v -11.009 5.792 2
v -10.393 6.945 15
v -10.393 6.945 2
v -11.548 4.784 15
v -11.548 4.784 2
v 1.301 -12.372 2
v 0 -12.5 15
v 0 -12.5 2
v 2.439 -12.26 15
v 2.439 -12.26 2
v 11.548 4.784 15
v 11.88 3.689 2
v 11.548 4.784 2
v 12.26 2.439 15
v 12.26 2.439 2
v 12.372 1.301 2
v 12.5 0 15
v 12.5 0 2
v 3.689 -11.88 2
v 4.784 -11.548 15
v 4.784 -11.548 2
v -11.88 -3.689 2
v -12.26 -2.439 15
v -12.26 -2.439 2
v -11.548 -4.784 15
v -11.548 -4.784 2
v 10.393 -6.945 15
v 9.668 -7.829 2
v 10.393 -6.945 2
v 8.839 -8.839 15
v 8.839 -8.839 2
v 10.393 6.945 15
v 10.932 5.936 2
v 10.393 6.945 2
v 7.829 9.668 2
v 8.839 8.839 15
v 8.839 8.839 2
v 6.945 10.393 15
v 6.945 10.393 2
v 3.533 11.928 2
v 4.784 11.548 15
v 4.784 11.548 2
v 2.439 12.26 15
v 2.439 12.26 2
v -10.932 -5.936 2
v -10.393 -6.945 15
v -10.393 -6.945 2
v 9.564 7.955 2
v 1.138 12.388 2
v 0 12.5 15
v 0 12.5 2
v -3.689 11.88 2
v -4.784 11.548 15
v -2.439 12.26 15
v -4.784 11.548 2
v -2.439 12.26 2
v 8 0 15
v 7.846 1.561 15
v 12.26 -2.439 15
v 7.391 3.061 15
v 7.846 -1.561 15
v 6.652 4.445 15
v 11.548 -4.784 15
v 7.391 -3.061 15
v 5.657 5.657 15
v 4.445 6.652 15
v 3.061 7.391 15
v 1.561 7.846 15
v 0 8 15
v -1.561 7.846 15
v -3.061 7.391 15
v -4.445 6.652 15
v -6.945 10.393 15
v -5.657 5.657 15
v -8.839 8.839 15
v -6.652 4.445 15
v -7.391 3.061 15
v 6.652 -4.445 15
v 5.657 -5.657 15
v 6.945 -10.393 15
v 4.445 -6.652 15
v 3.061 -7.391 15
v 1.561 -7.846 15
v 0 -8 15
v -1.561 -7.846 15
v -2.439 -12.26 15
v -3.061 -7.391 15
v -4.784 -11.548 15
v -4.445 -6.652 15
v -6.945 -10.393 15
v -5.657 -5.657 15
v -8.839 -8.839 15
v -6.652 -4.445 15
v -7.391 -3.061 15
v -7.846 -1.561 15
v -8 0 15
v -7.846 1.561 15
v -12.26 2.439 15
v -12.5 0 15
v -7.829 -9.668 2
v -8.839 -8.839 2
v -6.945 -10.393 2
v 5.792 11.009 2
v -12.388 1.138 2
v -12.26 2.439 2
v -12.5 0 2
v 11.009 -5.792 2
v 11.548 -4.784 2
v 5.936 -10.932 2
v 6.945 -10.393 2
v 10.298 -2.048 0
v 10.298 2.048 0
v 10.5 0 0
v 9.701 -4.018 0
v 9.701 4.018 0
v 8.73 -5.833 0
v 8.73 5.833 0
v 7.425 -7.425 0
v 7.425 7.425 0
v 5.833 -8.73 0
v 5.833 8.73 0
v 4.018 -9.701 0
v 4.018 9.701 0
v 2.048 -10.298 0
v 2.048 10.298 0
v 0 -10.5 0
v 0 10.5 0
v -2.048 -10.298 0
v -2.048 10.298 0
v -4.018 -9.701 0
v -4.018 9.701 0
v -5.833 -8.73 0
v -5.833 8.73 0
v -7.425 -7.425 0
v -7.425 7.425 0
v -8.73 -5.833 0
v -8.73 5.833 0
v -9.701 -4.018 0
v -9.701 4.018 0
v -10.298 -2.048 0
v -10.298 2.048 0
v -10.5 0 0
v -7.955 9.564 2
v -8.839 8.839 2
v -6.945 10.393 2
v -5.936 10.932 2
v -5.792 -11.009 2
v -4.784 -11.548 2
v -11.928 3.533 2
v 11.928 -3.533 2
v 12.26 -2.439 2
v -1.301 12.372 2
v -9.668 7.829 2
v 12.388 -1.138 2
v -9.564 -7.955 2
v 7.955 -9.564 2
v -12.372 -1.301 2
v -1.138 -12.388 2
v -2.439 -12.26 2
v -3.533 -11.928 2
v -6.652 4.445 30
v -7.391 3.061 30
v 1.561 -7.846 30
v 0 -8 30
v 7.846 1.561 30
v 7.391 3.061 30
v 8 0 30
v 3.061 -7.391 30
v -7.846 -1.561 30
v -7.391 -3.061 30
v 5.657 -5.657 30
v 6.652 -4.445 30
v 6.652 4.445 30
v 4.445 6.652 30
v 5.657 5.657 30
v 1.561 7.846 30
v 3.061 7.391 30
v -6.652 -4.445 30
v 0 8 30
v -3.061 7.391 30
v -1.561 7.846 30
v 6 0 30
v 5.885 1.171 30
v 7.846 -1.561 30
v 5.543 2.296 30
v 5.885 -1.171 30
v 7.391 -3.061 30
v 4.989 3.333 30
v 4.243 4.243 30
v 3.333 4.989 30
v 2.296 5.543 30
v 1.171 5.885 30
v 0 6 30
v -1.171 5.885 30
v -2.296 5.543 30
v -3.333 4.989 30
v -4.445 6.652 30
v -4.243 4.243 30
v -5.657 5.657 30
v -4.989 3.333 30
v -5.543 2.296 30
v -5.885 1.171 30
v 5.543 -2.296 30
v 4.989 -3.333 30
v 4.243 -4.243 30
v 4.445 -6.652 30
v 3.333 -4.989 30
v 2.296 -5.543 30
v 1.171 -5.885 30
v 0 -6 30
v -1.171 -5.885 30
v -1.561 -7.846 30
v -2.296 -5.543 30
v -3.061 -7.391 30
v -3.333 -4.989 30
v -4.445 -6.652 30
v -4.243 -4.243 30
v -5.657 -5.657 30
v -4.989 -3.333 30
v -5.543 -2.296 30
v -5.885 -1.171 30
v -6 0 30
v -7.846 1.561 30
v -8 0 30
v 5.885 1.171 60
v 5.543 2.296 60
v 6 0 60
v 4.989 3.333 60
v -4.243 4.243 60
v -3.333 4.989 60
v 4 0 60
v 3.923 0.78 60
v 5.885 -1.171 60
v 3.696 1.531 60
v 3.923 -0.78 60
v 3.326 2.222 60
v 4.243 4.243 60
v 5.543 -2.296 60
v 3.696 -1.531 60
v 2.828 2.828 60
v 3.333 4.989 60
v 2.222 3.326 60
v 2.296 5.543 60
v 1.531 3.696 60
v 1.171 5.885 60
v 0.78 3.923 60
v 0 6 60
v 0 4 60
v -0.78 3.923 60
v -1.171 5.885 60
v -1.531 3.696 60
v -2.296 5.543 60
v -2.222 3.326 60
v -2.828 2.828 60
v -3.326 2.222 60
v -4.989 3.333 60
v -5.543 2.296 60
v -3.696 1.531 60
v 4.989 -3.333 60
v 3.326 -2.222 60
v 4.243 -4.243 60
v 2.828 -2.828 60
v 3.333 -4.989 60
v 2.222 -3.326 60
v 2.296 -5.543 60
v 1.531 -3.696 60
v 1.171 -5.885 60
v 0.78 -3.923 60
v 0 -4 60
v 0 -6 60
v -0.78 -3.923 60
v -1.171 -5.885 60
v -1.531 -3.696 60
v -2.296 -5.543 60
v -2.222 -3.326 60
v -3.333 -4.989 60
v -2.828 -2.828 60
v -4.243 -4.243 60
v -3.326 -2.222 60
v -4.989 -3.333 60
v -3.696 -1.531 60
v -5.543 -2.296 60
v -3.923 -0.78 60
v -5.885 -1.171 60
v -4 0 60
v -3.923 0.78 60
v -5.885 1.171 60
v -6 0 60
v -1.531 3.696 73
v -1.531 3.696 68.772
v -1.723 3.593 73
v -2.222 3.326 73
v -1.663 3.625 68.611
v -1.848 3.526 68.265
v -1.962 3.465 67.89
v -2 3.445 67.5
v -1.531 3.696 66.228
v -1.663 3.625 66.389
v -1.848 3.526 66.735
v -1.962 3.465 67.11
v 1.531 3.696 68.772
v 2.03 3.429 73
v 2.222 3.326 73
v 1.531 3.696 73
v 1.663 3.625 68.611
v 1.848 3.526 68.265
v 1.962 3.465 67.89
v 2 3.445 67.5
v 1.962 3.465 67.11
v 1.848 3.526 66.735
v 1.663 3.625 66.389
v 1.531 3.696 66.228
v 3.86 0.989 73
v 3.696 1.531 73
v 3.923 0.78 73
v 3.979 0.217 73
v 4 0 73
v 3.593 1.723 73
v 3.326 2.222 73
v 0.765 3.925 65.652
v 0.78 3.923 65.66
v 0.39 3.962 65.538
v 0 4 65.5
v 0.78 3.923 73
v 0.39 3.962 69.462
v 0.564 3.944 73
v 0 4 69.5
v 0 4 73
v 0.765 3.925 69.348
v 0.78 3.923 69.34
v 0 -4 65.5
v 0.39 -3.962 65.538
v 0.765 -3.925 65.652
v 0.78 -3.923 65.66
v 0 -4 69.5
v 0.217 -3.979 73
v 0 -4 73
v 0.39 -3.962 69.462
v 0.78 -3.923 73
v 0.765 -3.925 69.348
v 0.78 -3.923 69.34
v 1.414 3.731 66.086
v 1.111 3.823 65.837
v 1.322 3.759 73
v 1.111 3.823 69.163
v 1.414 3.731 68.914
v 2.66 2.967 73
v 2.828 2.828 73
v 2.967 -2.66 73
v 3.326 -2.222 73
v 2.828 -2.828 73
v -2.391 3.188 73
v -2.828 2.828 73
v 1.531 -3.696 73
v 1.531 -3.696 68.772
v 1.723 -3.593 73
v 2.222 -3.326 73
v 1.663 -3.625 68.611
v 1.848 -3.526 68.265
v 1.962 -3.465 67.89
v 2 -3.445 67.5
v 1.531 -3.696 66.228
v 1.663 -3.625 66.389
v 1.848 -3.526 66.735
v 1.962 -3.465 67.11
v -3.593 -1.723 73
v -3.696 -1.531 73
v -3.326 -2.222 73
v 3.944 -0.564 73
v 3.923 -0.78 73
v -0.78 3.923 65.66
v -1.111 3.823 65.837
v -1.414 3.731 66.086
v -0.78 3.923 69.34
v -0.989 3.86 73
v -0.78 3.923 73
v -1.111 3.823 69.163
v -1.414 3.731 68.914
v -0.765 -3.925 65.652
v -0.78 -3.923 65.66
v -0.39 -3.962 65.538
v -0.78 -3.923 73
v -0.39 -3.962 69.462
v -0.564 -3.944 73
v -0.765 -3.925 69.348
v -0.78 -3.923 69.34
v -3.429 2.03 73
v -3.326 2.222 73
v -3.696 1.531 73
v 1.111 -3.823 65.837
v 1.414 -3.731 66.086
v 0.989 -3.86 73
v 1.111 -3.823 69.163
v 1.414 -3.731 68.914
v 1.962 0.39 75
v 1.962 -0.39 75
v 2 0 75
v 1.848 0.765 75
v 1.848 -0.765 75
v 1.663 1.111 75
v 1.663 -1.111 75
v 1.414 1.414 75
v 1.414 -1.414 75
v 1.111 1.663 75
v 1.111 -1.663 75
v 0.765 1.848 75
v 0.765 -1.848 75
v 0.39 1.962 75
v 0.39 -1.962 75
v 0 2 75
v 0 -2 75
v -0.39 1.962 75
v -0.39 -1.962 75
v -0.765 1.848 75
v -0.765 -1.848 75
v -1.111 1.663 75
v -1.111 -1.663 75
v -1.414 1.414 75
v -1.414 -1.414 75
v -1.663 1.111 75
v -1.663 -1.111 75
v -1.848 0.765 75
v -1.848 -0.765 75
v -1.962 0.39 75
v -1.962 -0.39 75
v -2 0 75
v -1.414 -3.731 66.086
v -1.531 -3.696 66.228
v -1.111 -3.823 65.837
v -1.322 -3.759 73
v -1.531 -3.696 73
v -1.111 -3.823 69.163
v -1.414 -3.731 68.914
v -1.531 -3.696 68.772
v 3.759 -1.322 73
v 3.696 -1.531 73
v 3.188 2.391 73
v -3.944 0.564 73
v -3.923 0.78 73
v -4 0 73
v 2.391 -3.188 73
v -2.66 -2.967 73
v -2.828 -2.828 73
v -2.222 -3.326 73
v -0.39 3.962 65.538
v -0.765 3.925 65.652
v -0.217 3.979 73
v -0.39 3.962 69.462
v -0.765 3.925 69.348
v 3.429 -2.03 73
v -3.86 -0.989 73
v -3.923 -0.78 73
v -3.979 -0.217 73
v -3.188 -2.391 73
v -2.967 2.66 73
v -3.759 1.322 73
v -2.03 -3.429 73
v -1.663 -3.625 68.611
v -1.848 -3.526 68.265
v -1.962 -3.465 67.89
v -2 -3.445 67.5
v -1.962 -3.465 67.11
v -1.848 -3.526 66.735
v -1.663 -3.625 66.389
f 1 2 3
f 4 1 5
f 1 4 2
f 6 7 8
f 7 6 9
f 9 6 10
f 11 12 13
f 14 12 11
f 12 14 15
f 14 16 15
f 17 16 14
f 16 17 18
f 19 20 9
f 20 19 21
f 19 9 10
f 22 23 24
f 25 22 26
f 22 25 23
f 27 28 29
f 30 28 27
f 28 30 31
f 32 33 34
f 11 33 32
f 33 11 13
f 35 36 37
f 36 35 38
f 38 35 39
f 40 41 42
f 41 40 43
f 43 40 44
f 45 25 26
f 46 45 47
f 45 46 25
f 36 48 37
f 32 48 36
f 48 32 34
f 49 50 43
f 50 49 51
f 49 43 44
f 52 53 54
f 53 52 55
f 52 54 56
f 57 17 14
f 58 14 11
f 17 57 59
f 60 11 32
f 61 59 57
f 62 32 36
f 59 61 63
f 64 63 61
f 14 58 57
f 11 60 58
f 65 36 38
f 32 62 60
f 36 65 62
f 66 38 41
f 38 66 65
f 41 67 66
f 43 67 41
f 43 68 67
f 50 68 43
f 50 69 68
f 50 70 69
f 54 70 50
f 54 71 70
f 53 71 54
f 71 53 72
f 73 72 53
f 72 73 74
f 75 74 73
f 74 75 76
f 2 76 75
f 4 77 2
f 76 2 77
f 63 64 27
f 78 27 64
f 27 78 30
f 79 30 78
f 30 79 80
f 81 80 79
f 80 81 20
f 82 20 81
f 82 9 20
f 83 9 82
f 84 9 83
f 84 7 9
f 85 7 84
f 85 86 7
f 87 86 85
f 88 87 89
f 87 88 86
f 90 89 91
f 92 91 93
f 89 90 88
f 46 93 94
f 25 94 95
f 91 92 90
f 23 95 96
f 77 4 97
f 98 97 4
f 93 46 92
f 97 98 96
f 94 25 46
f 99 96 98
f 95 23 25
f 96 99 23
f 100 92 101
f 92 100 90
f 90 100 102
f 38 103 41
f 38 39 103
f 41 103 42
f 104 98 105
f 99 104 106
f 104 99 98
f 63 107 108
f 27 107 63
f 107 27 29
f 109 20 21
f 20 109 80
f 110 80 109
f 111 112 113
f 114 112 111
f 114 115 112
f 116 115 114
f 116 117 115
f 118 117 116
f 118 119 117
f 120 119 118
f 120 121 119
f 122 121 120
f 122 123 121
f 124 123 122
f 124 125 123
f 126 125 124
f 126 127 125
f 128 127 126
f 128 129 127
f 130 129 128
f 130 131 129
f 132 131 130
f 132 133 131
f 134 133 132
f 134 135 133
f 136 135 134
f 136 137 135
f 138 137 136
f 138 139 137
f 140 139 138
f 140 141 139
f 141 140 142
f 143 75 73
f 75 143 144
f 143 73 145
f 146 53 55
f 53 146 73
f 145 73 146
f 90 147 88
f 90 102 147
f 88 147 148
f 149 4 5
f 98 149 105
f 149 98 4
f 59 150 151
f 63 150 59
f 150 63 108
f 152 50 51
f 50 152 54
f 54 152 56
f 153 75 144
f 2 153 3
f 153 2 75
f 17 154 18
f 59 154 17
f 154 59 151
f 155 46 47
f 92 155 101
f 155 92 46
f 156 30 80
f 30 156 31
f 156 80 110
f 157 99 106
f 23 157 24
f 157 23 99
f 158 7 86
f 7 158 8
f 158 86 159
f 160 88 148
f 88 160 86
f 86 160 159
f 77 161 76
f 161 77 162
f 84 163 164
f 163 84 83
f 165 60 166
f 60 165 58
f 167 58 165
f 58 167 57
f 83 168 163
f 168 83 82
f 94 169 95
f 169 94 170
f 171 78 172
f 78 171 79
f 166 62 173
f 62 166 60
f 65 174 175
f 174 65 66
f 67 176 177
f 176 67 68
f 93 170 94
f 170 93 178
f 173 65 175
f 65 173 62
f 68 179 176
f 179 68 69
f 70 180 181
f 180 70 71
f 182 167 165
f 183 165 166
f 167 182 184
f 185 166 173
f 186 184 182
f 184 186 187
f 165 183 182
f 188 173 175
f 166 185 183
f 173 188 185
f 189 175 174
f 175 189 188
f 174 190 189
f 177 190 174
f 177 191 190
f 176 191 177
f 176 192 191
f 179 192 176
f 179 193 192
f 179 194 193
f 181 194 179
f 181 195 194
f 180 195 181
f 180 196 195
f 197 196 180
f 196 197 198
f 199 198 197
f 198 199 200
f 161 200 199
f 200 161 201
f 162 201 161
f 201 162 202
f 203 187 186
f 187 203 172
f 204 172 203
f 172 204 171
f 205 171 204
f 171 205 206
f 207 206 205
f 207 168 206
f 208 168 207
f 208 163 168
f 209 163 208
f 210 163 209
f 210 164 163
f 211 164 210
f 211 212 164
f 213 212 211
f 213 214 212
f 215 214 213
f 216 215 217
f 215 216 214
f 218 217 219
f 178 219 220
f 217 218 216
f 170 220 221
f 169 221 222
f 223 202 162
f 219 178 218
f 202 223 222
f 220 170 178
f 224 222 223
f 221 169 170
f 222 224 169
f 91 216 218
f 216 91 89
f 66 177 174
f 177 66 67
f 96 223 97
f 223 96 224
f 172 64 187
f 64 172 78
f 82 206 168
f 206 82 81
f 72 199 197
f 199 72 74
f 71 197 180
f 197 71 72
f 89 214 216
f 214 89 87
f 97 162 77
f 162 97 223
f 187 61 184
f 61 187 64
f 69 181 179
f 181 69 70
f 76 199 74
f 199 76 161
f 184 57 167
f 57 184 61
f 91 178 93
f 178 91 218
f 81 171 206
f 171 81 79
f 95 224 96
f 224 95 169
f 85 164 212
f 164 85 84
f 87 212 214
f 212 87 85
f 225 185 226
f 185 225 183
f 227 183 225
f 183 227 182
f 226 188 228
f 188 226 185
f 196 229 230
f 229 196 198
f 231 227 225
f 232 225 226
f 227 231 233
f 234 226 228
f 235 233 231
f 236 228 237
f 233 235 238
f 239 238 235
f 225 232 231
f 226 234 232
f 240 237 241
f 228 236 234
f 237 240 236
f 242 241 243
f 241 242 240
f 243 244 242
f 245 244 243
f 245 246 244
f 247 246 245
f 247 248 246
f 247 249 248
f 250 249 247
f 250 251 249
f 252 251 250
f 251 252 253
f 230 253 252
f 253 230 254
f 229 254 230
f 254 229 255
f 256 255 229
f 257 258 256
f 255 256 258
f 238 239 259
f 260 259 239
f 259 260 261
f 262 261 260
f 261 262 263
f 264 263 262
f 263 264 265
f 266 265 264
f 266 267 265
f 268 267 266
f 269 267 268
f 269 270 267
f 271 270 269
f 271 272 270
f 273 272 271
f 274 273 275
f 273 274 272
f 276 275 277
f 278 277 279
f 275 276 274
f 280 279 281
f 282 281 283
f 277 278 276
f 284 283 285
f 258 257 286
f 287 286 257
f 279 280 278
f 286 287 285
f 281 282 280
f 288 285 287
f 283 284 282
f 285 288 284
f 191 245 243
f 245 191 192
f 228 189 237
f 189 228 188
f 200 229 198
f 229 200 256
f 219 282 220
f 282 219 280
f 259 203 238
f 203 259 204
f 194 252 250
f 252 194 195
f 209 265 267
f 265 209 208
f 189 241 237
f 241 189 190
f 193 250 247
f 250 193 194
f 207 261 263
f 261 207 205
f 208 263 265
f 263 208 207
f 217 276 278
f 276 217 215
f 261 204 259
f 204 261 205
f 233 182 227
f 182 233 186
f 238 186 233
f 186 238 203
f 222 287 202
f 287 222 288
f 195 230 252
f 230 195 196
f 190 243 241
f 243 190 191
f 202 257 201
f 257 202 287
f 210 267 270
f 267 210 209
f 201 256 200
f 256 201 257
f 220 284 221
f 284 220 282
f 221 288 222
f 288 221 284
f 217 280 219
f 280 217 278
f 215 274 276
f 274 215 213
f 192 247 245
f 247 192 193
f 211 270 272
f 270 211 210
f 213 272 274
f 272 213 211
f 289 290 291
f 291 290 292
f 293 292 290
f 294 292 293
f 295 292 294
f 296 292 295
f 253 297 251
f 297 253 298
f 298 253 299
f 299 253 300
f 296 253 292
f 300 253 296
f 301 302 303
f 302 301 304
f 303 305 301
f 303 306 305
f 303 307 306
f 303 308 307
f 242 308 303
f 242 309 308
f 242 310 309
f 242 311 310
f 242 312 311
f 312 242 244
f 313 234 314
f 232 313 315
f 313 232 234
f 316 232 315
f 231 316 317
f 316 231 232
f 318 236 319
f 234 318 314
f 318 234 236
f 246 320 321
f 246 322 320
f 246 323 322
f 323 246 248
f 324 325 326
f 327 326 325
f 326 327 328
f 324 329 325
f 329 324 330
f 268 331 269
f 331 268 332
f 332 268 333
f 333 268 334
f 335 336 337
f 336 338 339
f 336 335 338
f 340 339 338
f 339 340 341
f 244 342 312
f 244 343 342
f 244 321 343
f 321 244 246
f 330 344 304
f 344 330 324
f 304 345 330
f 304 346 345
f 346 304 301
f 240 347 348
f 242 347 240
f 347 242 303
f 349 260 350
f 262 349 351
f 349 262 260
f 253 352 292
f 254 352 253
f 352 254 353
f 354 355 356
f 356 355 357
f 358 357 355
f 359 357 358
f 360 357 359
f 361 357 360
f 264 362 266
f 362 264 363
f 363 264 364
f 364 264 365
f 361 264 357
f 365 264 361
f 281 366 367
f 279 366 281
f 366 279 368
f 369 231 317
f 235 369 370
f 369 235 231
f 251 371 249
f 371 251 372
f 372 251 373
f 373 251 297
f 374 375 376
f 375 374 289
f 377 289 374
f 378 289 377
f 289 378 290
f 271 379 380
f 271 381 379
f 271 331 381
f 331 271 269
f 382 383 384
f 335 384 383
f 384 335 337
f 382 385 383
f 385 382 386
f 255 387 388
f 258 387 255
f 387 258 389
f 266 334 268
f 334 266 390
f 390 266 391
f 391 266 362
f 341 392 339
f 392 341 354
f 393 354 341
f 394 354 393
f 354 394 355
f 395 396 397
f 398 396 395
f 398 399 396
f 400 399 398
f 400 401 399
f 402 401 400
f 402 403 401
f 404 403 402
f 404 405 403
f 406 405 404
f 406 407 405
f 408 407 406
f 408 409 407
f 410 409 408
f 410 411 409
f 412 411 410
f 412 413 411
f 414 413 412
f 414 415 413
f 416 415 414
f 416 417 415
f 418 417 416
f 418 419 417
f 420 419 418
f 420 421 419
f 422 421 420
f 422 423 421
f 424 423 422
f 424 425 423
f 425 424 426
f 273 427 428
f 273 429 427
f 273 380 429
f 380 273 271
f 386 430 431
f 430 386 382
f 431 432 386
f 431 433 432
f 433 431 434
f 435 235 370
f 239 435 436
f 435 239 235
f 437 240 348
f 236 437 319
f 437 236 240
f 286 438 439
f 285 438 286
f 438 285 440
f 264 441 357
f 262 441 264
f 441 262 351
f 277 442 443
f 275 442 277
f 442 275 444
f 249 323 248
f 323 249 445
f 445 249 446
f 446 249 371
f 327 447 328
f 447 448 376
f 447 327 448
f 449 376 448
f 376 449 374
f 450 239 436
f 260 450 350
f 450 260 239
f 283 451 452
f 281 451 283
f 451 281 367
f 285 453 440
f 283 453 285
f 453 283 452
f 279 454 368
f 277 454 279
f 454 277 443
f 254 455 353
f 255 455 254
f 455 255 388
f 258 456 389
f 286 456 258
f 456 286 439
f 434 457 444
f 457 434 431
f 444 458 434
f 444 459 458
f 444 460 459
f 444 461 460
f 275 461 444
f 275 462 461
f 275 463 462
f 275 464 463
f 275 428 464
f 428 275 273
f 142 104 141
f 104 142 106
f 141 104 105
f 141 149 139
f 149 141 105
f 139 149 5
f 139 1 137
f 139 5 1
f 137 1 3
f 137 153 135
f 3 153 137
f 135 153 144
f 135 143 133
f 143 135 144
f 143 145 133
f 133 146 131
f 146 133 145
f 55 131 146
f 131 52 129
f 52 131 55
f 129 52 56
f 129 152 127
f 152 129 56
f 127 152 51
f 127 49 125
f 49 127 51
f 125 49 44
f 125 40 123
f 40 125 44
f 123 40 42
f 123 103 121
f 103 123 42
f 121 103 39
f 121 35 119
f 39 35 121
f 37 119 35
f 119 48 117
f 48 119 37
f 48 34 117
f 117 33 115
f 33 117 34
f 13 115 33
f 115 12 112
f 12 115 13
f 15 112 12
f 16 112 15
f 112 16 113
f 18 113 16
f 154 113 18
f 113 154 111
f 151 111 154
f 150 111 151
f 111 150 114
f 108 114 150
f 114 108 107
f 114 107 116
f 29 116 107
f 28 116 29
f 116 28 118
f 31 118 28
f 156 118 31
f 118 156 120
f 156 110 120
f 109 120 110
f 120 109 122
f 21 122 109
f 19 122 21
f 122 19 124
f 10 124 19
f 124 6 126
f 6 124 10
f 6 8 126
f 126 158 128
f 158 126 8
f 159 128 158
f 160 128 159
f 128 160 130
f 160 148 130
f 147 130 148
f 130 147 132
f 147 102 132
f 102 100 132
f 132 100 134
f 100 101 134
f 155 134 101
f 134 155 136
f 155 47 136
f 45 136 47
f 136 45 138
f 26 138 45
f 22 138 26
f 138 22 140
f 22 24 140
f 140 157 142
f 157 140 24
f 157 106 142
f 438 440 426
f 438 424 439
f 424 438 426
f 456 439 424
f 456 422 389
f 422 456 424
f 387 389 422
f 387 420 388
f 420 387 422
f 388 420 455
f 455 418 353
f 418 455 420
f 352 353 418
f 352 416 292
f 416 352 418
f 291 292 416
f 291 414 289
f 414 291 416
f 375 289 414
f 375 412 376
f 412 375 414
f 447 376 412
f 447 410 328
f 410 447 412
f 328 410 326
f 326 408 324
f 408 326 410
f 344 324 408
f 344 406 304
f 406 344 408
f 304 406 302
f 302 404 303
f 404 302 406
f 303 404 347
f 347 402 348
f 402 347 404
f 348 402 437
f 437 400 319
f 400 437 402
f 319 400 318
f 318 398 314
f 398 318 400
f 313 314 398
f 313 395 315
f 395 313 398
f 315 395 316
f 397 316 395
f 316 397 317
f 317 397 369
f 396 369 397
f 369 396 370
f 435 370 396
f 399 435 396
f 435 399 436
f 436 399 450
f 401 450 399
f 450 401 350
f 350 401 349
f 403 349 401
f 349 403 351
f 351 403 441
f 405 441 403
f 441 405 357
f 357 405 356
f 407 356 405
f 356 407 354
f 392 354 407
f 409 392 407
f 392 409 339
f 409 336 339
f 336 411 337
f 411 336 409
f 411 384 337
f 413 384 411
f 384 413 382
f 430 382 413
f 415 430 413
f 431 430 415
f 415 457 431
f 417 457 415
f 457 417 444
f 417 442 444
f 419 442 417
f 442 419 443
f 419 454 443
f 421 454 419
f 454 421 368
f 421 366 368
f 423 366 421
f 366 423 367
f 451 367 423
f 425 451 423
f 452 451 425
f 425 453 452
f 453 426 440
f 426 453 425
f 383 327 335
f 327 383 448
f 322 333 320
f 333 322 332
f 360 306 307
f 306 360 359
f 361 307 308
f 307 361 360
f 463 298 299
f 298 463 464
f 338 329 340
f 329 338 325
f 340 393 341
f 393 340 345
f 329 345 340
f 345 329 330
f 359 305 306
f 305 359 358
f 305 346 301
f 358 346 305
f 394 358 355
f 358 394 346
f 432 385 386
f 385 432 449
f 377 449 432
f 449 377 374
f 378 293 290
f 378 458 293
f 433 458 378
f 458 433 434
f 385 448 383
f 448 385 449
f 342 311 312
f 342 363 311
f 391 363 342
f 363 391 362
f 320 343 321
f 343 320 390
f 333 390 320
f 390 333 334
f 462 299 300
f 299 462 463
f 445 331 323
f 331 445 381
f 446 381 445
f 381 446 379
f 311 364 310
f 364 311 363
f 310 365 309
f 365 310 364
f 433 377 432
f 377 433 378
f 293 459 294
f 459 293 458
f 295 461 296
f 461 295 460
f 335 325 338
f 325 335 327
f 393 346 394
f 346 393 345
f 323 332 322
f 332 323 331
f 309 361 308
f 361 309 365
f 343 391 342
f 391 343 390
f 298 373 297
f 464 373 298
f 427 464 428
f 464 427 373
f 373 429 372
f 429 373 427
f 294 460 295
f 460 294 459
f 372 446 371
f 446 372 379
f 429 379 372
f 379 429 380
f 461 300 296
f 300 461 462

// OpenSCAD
$fn = 32;

// ----------------------------------------------------------------------
// Stepped shaft: diameters 25, 16, 12, 8 mm, 75 mm long
// ----------------------------------------------------------------------

// --- parameters (mm) ---
d1 = 25;                  // step 1 diameter
len1 = 15;                // step 1 length
d2 = 16;                  // step 2 diameter
len2 = 15;                // step 2 length
d3 = 12;                  // step 3 diameter
len3 = 30;                // step 3 length
d4 = 8;                   // step 4 diameter
len4 = 15;                // step 4 length
total = 75;               // overall length
chamfer = 2;              // end chamfer
cross_d = 4;              // cross pin hole
cross_z = 67.5;           // cross hole position

difference() {
  /* turned body: stacked cylinders, every step sunk into the bigger one */
  union() {
    cylinder(h = len1, d = d1);
    translate([0, 0, 14.6]) cylinder(h = 15.4, d = d2);
    translate([0, 0, 29.6]) cylinder(h = 30.4, d = d3);
    translate([0, 0, 59.6]) cylinder(h = 15.4, d = d4);
  }
  /* bottom chamfer ring cut */
  rotate_extrude() translate([10.5, -2.5]) polygon([[0, 0], [4.5, 0], [4.5, 7], [0, 2.5]]);
  /* top chamfer ring cut */
  rotate_extrude() translate([2, 75]) polygon([[0, 0], [4.5, -4.5], [4.5, 2.5], [0, 2.5]]);
  /* cross pin hole through the small step */
  translate([0, 0, cross_z]) rotate([90, 0, 0]) cylinder(h = d4 + 5, d = cross_d, center = true);
}
